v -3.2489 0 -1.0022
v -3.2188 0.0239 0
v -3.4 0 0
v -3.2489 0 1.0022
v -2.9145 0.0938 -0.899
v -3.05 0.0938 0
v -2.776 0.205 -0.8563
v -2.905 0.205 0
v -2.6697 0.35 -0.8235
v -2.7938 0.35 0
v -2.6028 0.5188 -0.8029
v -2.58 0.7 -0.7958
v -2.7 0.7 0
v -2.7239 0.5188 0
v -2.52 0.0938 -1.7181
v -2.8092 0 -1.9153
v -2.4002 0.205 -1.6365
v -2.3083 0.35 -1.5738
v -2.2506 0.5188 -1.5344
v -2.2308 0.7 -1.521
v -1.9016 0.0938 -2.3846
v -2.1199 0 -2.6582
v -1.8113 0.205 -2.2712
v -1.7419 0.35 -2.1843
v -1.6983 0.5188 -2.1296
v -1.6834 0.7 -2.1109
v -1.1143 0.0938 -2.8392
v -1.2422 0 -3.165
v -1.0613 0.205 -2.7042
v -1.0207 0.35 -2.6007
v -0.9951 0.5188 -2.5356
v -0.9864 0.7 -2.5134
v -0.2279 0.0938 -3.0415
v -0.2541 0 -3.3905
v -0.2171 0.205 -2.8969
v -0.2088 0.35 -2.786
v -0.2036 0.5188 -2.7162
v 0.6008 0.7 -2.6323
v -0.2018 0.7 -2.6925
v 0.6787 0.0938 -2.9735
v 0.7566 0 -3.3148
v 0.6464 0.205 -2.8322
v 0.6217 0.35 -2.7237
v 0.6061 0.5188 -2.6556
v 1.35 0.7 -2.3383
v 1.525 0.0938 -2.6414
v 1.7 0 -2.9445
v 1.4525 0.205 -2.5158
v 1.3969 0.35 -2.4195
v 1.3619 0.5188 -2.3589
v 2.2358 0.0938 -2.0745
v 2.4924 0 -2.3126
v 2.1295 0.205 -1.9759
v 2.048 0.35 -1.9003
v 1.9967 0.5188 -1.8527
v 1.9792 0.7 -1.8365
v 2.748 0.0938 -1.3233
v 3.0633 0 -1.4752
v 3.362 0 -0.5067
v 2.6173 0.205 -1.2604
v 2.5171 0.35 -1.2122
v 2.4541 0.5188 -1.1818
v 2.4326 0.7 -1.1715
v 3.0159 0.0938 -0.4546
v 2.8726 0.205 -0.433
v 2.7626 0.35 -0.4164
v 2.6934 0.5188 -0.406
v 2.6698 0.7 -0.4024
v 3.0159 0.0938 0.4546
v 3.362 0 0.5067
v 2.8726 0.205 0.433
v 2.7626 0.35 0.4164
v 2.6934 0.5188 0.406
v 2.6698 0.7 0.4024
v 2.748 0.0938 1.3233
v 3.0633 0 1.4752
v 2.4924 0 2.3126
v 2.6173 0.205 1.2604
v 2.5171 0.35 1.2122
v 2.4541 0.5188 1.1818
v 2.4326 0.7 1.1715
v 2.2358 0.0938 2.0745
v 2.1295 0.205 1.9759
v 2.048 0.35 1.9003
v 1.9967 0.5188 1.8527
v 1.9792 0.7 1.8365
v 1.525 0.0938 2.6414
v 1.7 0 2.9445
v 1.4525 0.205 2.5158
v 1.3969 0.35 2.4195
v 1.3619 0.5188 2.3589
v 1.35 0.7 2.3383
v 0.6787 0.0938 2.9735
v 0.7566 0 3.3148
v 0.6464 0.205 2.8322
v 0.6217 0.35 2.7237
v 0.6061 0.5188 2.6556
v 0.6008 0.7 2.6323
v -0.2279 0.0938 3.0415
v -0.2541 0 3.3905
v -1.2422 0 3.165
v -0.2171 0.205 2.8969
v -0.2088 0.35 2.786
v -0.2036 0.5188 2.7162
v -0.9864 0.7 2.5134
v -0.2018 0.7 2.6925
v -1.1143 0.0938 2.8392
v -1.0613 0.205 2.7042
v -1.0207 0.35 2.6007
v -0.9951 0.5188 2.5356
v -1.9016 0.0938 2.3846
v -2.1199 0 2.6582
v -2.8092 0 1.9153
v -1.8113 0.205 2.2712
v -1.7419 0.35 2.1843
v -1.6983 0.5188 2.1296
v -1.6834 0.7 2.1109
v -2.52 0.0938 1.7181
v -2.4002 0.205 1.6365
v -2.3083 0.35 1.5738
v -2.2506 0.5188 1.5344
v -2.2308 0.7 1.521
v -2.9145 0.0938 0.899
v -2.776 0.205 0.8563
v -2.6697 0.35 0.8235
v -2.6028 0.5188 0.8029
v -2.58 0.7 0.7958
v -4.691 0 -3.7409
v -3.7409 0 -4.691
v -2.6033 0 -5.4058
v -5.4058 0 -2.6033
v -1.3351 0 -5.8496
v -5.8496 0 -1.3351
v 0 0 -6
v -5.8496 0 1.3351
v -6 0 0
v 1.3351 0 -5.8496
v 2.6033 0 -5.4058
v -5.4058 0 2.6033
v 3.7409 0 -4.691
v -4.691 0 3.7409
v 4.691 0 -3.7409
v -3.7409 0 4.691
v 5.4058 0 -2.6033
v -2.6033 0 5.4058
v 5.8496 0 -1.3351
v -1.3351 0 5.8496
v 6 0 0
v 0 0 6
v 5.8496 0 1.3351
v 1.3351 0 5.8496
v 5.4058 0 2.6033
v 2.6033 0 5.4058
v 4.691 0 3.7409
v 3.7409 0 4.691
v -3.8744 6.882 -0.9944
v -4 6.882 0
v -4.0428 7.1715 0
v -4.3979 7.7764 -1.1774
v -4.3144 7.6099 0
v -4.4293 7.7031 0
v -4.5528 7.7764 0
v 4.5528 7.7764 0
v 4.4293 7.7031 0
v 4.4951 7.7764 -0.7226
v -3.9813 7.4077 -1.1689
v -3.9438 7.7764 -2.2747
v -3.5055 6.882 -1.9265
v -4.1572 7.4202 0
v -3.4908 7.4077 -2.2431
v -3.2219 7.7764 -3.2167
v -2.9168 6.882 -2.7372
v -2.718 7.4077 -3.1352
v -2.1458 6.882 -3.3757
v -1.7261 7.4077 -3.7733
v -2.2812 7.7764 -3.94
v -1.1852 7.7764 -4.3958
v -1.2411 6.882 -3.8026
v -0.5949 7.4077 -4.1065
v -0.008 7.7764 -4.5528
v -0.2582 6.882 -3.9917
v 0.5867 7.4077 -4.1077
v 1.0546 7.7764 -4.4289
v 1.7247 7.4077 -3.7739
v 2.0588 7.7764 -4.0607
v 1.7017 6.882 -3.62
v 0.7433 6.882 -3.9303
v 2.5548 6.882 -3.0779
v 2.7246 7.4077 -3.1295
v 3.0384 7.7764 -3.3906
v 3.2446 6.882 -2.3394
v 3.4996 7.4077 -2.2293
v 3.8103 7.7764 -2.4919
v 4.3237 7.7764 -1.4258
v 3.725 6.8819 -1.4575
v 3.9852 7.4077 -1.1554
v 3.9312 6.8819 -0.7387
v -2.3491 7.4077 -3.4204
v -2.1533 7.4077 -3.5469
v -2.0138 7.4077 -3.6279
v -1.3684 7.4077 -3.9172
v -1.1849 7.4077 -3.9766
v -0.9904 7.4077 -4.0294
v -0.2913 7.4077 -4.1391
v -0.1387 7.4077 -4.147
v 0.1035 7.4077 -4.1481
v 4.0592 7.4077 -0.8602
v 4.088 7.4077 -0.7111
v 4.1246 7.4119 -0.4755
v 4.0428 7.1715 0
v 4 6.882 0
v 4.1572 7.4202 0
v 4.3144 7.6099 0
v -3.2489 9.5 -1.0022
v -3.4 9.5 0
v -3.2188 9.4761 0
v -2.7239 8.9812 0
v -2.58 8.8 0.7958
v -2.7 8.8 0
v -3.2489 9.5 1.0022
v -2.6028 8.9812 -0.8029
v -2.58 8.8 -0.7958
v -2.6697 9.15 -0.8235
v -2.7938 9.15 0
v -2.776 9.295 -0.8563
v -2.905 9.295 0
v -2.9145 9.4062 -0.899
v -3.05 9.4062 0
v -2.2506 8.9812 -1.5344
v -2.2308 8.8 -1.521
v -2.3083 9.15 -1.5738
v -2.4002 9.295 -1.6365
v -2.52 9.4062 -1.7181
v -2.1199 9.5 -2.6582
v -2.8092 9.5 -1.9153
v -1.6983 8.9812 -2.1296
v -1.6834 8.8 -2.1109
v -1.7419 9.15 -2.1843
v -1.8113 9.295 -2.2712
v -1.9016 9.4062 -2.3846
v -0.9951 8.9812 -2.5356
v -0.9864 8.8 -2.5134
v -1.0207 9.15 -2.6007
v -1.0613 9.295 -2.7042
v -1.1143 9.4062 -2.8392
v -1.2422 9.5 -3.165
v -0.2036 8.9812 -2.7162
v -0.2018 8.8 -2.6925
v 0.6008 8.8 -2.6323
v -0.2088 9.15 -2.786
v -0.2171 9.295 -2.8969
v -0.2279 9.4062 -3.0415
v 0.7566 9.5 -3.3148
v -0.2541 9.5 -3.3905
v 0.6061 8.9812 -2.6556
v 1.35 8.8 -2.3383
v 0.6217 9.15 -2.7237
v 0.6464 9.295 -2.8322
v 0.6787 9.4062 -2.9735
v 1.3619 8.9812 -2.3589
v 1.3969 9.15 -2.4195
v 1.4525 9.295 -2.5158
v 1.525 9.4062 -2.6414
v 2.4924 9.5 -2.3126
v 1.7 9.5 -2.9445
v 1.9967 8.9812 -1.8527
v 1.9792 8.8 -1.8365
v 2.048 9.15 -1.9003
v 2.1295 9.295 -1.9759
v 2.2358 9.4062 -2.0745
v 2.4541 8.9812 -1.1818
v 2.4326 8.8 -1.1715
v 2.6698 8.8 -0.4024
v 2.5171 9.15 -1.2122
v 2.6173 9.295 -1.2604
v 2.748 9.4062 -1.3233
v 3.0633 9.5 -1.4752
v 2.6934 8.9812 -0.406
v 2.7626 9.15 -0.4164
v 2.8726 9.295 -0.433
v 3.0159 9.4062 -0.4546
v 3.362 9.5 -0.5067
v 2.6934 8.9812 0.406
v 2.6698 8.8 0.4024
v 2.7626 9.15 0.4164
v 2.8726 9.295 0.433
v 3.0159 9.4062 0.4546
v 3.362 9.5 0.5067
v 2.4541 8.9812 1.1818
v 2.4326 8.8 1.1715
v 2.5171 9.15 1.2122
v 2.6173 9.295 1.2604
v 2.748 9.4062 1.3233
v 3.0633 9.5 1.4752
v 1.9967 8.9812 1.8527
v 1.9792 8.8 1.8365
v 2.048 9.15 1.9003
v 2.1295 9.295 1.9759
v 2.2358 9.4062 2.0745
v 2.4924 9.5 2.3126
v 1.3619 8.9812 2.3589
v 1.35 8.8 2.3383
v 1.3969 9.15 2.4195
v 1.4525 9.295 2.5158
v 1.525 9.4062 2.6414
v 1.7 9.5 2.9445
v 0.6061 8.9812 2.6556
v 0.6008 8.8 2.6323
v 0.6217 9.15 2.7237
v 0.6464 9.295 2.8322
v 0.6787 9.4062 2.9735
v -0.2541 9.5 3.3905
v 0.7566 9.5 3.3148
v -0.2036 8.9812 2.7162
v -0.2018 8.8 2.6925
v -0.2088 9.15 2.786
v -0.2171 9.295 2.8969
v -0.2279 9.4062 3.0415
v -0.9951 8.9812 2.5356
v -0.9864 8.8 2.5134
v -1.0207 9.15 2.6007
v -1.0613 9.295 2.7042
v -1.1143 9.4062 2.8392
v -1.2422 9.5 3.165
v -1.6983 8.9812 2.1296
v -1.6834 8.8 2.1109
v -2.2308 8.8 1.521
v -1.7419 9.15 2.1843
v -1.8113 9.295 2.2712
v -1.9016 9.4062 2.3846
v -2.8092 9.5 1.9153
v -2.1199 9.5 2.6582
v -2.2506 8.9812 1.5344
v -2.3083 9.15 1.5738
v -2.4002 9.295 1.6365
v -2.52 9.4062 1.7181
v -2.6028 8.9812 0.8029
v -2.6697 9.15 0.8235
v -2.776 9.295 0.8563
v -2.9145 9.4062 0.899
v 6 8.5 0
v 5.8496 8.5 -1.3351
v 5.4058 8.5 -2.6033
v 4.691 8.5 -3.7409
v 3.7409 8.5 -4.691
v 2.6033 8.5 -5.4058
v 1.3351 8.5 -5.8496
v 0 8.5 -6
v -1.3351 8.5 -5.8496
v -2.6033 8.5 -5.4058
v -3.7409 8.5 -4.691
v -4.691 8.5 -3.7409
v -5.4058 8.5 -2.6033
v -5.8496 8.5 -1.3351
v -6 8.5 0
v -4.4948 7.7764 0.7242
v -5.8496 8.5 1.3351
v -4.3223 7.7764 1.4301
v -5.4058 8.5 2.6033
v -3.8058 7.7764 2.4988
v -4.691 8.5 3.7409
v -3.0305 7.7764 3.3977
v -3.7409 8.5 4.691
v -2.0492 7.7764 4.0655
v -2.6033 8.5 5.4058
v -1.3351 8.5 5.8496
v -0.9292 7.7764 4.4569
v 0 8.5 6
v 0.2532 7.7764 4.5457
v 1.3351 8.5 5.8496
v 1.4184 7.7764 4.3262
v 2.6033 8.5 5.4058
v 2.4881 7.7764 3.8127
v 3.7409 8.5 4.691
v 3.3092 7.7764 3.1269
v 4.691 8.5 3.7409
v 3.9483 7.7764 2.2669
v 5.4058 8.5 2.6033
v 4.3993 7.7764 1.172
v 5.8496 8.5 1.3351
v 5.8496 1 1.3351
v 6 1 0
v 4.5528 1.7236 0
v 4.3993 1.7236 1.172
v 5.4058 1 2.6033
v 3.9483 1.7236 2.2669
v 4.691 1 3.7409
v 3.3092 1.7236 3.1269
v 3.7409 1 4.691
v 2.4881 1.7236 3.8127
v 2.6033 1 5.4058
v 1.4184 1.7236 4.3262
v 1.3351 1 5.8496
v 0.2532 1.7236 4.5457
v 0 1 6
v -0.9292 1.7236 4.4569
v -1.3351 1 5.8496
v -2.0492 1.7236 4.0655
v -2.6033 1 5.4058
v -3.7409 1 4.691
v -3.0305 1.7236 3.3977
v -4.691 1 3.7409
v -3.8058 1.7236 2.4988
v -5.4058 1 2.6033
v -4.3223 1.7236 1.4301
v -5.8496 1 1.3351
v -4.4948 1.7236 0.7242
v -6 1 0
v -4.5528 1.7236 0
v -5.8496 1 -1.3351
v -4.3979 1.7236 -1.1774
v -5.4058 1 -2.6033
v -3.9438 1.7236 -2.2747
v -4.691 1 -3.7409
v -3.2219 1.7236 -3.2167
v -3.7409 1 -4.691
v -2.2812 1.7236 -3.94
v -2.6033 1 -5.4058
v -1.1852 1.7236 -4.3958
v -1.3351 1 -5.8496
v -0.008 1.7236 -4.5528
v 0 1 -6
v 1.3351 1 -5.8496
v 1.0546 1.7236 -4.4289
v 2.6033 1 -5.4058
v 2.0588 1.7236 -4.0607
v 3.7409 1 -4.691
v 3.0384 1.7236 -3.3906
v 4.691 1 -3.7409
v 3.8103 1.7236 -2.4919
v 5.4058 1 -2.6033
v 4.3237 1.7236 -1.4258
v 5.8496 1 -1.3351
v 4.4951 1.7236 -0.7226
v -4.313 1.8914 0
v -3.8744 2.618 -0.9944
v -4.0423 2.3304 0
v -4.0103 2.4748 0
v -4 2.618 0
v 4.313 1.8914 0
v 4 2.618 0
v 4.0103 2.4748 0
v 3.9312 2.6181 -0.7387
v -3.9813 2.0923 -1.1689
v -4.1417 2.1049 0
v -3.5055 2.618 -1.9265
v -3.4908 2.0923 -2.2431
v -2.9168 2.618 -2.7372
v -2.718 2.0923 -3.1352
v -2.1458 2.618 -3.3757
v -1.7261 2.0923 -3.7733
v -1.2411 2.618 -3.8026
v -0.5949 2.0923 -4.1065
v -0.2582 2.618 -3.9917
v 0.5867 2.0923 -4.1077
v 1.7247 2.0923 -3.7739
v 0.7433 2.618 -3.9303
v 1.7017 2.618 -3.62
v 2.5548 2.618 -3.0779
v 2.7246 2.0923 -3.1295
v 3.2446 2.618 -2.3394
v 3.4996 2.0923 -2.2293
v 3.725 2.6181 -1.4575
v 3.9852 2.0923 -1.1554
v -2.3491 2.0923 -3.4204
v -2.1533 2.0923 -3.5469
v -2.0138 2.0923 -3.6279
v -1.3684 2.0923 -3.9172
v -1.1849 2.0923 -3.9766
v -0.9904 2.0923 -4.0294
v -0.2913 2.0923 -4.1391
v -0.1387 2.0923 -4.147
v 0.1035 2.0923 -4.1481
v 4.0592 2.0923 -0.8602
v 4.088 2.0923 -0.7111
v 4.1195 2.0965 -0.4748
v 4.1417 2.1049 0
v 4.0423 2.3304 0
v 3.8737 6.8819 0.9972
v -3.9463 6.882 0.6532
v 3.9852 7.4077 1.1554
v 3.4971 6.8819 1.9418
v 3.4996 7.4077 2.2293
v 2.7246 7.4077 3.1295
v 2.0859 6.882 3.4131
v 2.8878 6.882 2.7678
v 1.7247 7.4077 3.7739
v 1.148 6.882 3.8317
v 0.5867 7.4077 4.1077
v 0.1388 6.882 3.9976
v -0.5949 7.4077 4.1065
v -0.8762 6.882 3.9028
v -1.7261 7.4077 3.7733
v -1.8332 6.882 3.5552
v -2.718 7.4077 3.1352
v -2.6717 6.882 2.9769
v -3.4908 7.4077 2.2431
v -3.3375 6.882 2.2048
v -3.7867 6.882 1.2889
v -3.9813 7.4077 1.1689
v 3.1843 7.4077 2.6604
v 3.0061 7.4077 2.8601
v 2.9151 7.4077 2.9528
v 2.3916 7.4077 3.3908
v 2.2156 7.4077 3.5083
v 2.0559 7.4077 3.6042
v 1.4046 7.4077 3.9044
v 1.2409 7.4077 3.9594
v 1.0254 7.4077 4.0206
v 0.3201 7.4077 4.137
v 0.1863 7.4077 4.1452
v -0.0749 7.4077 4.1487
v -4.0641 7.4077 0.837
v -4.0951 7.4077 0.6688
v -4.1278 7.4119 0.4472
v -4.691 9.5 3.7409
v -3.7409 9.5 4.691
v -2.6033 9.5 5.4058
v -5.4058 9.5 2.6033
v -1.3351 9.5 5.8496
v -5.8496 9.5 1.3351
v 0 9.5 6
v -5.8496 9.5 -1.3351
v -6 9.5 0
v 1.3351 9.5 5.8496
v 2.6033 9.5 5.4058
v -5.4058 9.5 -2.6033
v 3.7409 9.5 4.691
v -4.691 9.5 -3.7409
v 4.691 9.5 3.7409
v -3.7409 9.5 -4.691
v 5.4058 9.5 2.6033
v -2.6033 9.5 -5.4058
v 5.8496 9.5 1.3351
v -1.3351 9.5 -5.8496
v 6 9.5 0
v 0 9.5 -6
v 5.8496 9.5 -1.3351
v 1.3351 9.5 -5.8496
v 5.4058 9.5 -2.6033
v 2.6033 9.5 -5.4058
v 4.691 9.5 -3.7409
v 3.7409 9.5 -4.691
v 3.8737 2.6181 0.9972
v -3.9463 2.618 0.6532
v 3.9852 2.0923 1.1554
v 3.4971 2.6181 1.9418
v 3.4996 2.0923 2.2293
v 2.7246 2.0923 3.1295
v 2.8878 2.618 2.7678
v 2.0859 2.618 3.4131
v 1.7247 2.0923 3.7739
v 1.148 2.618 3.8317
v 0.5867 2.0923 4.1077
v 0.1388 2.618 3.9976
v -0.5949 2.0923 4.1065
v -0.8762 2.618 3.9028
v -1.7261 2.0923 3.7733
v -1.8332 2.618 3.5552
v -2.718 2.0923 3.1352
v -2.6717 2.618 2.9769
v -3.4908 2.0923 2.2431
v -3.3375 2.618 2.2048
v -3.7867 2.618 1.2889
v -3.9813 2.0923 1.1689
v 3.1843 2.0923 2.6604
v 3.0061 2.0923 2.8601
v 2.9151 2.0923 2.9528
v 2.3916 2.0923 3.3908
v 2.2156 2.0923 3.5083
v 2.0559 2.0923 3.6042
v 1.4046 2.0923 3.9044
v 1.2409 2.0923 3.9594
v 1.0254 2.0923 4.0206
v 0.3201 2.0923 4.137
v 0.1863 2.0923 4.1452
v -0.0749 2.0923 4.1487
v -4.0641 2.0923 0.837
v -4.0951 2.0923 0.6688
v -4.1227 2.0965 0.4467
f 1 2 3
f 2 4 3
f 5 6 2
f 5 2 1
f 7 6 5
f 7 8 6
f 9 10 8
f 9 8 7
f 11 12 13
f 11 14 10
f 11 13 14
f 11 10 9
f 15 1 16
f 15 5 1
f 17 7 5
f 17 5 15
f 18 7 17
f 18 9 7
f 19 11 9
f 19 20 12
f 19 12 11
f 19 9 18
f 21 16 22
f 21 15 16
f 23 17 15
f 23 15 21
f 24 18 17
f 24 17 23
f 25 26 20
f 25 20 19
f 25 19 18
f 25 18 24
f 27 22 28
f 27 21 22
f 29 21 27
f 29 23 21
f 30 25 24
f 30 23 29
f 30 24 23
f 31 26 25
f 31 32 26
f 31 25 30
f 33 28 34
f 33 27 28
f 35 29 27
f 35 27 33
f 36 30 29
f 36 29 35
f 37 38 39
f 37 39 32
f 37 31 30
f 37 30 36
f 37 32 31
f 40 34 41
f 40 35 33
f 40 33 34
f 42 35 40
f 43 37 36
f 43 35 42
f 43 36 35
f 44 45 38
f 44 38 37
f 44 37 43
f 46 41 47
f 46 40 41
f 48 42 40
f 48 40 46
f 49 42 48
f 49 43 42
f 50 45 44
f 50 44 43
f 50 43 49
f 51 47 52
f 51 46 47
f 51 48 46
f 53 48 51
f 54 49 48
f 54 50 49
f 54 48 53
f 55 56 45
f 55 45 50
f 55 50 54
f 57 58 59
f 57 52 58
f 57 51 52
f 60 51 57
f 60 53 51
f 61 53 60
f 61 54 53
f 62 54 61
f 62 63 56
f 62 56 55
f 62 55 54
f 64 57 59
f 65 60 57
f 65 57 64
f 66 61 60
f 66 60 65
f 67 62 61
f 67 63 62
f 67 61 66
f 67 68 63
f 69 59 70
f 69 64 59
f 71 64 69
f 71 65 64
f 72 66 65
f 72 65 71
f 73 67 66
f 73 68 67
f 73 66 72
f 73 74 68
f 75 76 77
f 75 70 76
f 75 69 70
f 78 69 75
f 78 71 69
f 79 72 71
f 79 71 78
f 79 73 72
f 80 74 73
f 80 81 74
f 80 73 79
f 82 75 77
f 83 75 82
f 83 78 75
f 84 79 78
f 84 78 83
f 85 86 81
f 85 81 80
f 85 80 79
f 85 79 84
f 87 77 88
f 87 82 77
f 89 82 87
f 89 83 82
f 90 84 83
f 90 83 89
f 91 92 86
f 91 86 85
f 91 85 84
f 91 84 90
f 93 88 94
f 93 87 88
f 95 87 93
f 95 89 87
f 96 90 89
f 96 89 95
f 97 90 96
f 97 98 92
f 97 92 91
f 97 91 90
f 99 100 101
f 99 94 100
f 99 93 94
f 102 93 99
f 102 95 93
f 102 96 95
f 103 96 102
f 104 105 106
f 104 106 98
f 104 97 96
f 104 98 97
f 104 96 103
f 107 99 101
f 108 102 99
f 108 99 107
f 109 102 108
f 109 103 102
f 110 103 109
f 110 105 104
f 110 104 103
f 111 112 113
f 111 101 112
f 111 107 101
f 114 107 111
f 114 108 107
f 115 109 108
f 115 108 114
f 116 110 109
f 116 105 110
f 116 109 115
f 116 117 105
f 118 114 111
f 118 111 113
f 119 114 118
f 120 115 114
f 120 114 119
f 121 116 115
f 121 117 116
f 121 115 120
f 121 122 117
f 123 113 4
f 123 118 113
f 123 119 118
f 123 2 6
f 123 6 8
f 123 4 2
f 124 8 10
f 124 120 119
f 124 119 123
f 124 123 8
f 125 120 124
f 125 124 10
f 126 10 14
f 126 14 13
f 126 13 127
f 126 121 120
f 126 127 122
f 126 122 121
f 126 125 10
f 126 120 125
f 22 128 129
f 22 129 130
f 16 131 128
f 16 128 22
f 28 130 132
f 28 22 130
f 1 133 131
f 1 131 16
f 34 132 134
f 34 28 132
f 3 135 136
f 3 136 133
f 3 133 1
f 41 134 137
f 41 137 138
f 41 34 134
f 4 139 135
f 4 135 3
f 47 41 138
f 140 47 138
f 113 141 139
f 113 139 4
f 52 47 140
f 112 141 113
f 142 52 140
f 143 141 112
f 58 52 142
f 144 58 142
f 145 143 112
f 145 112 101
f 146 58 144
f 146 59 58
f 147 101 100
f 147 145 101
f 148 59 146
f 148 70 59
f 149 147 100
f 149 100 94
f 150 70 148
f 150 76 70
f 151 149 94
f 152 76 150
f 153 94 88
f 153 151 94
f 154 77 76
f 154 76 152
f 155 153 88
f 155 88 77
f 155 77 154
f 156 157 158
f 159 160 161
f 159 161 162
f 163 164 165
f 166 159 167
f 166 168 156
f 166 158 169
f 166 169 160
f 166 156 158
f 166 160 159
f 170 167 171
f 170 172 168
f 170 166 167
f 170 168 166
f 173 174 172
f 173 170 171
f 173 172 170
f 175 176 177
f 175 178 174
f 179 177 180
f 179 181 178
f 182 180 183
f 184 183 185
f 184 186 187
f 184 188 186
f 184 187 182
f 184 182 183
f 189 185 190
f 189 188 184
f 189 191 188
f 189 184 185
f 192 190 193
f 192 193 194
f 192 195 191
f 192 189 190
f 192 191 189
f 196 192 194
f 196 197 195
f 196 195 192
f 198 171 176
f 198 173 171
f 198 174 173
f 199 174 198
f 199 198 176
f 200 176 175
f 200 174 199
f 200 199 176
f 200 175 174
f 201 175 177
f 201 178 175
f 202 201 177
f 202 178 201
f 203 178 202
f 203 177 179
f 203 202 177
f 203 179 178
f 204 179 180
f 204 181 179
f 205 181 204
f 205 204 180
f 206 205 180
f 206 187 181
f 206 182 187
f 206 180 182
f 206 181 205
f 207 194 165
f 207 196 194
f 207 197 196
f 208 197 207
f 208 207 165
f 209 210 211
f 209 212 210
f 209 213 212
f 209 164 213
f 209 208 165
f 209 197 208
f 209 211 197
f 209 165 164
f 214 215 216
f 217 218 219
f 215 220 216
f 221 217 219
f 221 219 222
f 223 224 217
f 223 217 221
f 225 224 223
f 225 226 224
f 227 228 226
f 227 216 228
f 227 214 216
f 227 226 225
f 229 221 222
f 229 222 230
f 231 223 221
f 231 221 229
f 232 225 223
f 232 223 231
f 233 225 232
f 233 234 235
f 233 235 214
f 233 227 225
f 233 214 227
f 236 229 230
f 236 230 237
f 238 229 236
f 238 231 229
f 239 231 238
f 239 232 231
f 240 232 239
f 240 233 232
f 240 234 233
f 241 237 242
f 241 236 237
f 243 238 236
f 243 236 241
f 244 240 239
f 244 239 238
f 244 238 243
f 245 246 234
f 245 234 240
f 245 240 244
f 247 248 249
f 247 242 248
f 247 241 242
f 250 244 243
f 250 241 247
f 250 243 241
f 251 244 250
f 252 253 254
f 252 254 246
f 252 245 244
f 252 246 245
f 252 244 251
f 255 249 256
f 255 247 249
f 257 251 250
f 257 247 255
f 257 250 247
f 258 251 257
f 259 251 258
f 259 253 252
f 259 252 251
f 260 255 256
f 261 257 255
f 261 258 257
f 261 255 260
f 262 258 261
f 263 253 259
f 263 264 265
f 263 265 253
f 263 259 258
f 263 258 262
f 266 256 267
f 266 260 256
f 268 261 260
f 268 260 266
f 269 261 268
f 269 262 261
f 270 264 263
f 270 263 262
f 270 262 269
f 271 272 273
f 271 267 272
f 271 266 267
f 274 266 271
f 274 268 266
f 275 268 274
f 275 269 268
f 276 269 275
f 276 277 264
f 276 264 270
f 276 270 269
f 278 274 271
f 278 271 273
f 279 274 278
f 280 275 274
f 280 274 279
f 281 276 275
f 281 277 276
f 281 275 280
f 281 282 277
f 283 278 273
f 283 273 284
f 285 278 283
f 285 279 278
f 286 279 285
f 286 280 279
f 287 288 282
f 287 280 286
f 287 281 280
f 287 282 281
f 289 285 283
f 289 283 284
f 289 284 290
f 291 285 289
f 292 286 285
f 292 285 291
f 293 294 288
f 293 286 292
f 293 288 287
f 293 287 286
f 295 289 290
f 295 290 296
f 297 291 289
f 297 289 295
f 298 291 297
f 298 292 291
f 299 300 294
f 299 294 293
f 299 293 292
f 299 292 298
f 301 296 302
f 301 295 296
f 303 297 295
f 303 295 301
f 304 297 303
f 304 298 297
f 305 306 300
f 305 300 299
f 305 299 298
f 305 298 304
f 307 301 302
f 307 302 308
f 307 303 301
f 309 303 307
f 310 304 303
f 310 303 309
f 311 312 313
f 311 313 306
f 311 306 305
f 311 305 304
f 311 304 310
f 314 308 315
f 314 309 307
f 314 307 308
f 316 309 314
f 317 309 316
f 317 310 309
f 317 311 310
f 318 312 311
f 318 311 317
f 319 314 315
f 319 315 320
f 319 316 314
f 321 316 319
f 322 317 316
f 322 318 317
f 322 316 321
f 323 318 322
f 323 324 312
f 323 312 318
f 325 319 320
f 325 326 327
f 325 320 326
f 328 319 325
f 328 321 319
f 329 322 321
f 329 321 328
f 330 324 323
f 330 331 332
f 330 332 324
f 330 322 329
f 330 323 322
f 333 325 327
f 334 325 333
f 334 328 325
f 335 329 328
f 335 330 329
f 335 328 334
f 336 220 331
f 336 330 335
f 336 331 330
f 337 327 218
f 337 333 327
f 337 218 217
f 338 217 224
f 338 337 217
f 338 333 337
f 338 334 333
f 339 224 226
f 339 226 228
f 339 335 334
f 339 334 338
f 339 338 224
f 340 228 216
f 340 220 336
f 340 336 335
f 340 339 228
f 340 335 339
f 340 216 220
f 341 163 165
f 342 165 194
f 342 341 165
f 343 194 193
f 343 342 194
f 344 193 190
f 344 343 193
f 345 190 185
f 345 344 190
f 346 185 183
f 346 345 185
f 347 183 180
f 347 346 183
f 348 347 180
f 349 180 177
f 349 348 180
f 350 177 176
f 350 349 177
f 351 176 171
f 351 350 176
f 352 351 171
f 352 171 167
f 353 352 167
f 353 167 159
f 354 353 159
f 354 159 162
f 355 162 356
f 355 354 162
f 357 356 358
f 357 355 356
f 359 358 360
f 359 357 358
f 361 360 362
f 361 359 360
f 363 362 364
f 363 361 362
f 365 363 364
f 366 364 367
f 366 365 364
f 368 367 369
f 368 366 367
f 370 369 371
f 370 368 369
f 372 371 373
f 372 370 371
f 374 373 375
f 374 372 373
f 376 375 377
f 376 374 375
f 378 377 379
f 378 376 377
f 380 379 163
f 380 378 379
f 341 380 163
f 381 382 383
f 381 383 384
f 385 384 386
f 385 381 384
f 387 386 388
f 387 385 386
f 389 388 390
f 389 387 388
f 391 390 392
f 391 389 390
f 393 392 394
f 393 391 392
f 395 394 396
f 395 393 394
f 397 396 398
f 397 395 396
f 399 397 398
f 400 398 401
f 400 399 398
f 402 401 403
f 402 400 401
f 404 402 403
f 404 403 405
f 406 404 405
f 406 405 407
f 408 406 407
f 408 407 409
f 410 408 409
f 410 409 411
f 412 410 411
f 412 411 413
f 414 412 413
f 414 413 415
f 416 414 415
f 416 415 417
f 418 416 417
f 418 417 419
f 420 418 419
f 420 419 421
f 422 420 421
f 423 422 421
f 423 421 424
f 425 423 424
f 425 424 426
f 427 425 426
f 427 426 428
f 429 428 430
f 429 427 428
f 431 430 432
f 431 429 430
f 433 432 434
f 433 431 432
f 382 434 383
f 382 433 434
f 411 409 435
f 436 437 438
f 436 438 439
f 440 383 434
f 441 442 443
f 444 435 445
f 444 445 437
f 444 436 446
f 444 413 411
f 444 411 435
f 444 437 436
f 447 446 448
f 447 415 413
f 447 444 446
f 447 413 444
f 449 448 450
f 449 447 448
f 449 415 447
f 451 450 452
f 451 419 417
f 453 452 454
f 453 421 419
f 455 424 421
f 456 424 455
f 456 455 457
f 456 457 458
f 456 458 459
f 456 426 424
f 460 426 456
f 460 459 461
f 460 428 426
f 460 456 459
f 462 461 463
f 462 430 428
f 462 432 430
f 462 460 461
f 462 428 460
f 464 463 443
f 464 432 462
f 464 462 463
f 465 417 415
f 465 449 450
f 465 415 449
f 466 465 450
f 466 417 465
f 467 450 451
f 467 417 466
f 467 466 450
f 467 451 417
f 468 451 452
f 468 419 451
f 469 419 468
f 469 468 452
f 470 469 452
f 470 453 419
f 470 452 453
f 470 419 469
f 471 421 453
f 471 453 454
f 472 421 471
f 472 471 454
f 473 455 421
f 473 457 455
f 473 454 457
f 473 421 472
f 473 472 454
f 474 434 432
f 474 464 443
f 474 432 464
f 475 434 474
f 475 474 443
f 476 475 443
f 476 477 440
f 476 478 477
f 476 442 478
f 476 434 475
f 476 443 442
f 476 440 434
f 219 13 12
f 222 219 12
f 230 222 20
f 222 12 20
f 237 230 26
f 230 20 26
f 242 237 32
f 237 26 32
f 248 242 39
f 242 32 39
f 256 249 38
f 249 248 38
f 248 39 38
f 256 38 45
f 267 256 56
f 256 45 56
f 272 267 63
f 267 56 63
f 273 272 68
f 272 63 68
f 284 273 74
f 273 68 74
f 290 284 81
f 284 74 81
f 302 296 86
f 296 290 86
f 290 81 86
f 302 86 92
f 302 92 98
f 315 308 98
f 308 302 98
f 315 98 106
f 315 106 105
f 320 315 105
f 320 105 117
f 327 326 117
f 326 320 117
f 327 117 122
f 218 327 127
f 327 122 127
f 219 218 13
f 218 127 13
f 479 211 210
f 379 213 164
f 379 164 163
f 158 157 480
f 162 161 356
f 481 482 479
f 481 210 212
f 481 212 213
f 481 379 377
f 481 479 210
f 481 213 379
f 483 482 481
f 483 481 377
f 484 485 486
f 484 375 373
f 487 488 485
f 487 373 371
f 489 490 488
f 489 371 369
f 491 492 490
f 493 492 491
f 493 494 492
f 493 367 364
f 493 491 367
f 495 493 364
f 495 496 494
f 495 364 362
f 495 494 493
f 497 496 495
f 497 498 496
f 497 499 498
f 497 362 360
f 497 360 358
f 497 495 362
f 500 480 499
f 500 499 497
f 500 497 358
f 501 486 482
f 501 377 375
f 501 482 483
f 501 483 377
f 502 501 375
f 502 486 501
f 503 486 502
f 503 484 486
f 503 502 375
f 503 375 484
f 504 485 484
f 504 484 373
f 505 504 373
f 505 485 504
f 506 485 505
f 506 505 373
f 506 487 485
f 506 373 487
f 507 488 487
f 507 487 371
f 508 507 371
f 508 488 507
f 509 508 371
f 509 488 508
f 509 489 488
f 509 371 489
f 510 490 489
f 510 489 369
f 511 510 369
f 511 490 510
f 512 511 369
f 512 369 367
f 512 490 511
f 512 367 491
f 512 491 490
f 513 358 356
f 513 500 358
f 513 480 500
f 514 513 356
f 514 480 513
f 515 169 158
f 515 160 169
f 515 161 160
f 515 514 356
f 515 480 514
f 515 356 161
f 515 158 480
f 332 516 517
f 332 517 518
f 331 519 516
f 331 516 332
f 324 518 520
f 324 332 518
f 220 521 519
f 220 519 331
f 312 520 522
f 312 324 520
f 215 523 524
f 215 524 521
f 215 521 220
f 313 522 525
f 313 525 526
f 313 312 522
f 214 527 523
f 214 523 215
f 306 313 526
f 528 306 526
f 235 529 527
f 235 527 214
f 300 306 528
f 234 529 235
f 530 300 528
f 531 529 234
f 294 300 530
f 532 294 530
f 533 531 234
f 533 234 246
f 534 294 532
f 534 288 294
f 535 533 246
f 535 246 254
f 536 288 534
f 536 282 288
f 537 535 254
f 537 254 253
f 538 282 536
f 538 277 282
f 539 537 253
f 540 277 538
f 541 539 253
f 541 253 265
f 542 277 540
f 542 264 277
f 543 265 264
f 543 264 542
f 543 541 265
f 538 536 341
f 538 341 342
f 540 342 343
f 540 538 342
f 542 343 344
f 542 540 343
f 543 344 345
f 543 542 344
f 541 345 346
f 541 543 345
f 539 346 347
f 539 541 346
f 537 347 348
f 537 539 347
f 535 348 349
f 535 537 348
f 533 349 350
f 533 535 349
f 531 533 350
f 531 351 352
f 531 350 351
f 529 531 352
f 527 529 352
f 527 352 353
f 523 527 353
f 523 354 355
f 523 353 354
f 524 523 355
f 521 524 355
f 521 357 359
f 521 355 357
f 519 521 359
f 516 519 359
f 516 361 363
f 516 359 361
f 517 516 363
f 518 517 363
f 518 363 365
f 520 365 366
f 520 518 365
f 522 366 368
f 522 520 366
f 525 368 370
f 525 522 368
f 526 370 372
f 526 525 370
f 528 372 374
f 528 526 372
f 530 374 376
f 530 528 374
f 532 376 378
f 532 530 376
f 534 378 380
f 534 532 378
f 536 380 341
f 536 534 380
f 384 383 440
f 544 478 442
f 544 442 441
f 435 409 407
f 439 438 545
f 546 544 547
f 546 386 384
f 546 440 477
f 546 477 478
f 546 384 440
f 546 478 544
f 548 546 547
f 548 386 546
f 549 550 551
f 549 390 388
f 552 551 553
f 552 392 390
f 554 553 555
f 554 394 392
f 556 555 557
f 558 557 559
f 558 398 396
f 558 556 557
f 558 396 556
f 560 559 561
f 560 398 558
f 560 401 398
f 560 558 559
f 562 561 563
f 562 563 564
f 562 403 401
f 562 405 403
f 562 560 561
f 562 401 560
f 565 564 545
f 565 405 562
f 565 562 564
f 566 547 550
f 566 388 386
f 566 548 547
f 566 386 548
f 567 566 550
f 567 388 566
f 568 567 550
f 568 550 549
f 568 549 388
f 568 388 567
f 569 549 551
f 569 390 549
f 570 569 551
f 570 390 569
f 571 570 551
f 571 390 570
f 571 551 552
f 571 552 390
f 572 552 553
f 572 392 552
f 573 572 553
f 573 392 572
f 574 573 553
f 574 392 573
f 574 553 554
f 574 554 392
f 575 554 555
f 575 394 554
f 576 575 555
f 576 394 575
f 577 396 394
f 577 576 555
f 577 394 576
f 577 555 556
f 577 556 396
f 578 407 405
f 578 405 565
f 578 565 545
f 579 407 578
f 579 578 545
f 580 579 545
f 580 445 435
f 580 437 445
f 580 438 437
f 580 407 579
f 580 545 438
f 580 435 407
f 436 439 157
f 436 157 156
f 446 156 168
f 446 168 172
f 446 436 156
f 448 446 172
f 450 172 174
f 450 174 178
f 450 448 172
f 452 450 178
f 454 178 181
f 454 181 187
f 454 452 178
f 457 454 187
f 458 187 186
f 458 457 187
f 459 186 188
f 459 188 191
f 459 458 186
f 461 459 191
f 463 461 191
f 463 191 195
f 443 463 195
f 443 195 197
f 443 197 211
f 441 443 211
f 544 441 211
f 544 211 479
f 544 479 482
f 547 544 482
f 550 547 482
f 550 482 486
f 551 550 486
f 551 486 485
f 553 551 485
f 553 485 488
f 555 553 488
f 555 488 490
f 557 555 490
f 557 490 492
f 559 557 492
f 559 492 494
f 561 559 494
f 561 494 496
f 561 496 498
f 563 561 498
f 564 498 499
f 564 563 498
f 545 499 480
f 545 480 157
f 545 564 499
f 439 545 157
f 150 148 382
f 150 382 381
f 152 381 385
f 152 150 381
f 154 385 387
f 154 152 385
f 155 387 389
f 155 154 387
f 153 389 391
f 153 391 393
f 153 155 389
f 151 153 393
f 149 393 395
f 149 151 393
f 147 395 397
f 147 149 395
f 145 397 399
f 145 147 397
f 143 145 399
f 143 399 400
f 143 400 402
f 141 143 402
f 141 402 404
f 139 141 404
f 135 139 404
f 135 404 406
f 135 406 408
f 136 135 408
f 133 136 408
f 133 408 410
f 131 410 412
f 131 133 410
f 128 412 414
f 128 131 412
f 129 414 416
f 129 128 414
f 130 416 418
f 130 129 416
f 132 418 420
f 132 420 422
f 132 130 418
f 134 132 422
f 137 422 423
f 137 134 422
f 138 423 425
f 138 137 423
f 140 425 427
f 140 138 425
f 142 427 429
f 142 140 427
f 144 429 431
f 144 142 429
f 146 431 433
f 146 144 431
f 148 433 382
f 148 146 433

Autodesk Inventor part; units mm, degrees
ref_plane "YZ Plane" through (0, 0, 0) normal (1, 0, 0) x (0, 1, 0)
ref_plane "XZ Plane" through (0, 0, 0) normal (0, 1, 0) x (-1, 0, 0)
ref_plane "XY Plane" through (0, 0, 0) normal (0, 0, 1) x (1, 0, 0)
sketch "Эскиз1" plane through (0, 0, 0) normal (0, 1, 0) x (-1, 0, 0)
  circle A0 centre (0, 0) radius 2.7
  circle A1 centre (0, 0) radius 4
  dimension "d13" = 5.4
  dimension "d14" = 8
extrude "Выдавливание1" add sketch "Эскиз1" along normal blind 9.5
sketch "Эскиз2" plane through (0, 9.5, 0) normal (0, 1, 0) x (1, 0, 0)
  circle A0 centre (0, 0) radius 1.6
  circle A1 centre (0, 0) radius 6
  circle A2 centre (0, 0) radius 2.7
  dimension "d15" = 12
extrude "Выдавливание2" add sketch "Эскиз2" against normal blind 2 contours A1
sketch "Эскиз3" plane through (0, 0, 0) normal (0, -1, 0) x (1, 0, 0)
  circle A0 centre (0, 0) radius 2.7
  circle A1 centre (0, 0) radius 6
extrude "Выдавливание3" add sketch "Эскиз3" against normal blind 2
sketch "Эскиз4" plane through (0, 0, 0) normal (0, 0, 1) x (1, 0, 0)
  line L0 (-2.7, 9.5) -> (2.7, 9.5) projected
  line L1 (0, 9.5) -> (0, 0)
  line L2 (6, 9.5) -> (6, 7.5) projected
  line L3 (-4, 7.5) -> (4, 7.5) projected
  line L4 (6, 8.5) -> (4, 7.5)
  line L5 (6, 8.5) -> (6, 7.5)
  line L6 (-6, 7.5) -> (6, 7.5) projected
  line L7 (4, 7.5) -> (6, 7.5)
  line L8 (6, 0) -> (6, 2) projected
  line L9 (6, 1) -> (4, 2)
  line L10 (4, 2) -> (6, 2)
  line L11 (6, 1) -> (6, 2)
  point P0 (5.5, 0)
revolve "Вращение1" cut sketch "Эскиз4" angle 360 about axis through (0, 9.5, 0) along (0, -1, 0)
fillet "Сопряжение1" radius 1 4 edges at (0, 7.5, -4) (0, 7.5, 4) (0, 2, -4) (0, 2, 4)
fillet "Сопряжение2" radius 0.7 2 edges at (2.7, 0, 0) (2.7, 9.5, 0)
properties part number "rolik"
